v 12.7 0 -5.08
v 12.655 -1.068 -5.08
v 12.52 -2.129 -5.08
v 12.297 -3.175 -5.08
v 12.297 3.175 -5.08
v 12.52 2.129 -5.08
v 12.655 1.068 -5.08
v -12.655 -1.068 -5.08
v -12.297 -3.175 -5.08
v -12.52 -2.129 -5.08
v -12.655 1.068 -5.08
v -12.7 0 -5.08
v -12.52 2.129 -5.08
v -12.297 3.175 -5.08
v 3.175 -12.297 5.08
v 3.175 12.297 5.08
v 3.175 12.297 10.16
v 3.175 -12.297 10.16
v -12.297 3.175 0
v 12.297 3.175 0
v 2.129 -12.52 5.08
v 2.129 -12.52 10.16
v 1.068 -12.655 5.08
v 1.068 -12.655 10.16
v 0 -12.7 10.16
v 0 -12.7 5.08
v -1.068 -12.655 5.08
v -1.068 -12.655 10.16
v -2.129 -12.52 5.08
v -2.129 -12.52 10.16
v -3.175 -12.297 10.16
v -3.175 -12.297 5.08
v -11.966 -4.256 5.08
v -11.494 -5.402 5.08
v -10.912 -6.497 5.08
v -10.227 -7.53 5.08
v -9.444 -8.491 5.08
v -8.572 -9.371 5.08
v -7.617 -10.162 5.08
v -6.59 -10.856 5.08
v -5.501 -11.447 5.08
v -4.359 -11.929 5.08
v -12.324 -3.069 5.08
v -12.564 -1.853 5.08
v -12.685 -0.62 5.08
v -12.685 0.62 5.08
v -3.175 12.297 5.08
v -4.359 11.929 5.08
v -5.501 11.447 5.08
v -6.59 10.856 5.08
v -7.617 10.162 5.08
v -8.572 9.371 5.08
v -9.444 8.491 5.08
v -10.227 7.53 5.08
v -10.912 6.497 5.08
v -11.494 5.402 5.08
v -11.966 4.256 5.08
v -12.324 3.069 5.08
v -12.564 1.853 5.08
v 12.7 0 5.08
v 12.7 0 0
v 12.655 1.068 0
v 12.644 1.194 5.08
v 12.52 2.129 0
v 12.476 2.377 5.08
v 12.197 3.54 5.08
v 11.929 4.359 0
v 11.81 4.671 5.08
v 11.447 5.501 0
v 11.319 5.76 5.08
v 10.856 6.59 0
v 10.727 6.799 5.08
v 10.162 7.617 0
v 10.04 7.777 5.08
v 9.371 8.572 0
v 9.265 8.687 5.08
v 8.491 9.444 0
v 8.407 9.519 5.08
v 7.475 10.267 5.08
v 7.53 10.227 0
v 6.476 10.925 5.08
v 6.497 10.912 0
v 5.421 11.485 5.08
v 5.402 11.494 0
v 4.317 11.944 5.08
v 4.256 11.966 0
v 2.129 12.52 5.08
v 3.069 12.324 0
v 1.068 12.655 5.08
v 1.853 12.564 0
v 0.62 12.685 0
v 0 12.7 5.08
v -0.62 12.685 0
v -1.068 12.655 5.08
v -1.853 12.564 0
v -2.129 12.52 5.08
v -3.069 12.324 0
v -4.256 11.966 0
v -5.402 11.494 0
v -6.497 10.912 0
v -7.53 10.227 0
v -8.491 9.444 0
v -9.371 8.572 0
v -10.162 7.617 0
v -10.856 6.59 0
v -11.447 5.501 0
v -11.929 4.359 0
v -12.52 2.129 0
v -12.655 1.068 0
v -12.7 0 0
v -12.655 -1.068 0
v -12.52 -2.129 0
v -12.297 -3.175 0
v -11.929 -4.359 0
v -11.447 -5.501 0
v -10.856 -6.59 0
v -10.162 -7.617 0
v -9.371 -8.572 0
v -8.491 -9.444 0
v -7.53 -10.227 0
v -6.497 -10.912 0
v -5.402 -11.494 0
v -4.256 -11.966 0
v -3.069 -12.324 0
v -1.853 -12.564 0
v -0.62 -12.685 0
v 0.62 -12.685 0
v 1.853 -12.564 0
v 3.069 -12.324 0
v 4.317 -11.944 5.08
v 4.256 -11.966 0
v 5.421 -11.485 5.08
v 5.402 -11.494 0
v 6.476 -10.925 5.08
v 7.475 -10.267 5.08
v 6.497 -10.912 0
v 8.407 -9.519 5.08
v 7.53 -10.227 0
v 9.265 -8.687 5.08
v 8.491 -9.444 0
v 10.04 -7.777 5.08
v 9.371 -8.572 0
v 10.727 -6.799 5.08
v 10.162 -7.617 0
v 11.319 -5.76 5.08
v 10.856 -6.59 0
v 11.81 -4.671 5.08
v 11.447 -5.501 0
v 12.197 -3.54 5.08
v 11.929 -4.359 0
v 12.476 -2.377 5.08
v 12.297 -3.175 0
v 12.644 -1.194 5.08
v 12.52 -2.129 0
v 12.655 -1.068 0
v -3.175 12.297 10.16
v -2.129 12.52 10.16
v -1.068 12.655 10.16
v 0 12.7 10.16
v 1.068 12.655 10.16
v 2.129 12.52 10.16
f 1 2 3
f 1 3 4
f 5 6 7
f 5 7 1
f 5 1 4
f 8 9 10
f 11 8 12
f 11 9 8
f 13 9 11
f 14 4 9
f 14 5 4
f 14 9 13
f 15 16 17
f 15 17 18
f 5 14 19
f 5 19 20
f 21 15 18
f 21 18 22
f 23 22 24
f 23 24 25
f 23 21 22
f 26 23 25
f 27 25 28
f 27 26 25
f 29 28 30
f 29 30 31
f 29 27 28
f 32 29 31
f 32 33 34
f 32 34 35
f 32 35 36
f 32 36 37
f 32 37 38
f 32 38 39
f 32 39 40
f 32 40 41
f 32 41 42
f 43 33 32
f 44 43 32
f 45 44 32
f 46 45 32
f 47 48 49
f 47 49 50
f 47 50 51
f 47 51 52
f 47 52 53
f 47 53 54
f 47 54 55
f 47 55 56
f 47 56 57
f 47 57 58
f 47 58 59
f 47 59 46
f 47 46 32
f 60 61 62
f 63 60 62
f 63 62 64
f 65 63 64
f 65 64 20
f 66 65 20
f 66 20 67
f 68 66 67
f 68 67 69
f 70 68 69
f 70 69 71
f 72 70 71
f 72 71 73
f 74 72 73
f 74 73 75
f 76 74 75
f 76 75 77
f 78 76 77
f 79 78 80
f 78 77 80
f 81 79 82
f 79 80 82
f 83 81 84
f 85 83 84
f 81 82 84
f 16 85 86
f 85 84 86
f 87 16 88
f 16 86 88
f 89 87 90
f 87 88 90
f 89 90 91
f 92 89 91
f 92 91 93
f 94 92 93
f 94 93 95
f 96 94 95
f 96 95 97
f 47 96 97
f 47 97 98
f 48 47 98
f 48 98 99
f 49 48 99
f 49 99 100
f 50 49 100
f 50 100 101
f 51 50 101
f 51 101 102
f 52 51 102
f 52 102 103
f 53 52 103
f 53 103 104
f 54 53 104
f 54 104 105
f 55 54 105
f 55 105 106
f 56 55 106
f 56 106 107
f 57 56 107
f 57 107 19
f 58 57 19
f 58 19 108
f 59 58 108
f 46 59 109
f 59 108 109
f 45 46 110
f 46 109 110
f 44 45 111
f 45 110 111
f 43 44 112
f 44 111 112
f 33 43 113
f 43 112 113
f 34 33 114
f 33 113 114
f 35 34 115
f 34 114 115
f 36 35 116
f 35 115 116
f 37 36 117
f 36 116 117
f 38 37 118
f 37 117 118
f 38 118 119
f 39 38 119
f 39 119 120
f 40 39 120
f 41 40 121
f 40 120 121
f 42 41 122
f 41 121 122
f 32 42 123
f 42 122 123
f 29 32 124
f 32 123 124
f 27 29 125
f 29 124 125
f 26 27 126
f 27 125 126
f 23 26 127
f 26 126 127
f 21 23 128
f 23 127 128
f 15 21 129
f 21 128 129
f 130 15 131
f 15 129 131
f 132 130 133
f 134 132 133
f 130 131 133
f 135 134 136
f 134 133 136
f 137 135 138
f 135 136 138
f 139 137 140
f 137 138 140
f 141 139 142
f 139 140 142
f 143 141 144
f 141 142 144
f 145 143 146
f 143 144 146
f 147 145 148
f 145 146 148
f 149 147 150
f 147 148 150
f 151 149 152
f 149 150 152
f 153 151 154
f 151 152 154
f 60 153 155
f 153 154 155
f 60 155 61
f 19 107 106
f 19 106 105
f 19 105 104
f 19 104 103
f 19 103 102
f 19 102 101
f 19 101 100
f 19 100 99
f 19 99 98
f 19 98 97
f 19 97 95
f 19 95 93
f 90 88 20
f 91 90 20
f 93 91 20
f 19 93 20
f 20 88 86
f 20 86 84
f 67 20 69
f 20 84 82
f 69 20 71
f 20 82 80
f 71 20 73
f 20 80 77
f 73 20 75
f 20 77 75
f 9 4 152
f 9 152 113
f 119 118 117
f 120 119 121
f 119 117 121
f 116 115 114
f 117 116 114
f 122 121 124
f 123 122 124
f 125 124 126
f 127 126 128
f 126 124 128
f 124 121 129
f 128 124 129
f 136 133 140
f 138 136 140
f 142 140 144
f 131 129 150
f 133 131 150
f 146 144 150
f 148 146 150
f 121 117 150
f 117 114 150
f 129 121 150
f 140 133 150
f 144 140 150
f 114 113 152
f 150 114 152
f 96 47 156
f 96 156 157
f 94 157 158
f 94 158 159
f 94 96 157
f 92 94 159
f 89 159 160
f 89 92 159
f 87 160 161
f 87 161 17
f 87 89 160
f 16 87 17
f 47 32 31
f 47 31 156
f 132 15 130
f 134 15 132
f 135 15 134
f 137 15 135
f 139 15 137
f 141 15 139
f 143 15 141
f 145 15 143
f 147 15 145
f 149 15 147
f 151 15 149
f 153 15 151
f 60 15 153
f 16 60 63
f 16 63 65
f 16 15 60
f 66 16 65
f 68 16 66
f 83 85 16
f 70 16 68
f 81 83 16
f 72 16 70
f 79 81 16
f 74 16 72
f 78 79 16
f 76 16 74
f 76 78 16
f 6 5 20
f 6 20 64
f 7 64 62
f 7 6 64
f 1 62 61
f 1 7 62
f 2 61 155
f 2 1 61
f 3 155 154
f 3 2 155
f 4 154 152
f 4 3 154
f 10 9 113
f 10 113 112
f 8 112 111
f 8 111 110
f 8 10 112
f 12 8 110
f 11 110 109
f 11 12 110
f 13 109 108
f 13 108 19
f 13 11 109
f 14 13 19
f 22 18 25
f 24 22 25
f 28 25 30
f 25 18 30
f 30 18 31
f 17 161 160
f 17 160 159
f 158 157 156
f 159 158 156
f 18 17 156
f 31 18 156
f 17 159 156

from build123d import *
from build123d.topology import SkipClean

# Parameters (mm, degrees)
SKETCH1_R           = 12.7
BOSS_EXTRUDE1_DEPTH = 5.08
BOSS_EXTRUDE2_START = 5.08
BOSS_EXTRUDE2_DEPTH = 5.08
BOSS_EXTRUDE3_DEPTH = 5.08


with BuildPart() as part:
    # Sketch1 → Boss-Extrude1 (new body)
    with BuildSketch(Plane.XY):
        Circle(SKETCH1_R)
    extrude(amount=BOSS_EXTRUDE1_DEPTH)

    # Sketch2 → Boss-Extrude2 (add)
    with SkipClean():  # the faces are left unmerged after this step: merging them gives an invalid solid
        with BuildSketch(Plane(origin=(0, 0, 0), x_dir=(-1, 0, 0), z_dir=(0, 0, -1)).offset(BOSS_EXTRUDE2_START)):
            with BuildLine():
                Line((12.296722124, 3.175), (-12.296722124, 3.175))
                ThreePointArc((-12.296722124, 3.175), (-12.7, 0), (-12.296722124, -3.175))
                Line((-12.296722124, -3.175), (12.296722124, -3.175))
                ThreePointArc((12.296722124, -3.175), (12.7, 0), (12.296722124, 3.175))
            make_face()
        extrude(amount=-BOSS_EXTRUDE2_DEPTH)

    # Sketch4 → Boss-Extrude3 (add)
    with SkipClean():  # the faces are left unmerged after this step: merging them gives an invalid solid
        with BuildSketch(Plane.XY.offset(5.08)):
            with BuildLine():
                Line((-3.175, -12.296722124), (-3.175, 12.296722124))
                ThreePointArc((-3.175, 12.296722124), (0, 12.7), (3.175, 12.296722124))
                Line((3.175, 12.296722124), (3.175, -12.296722124))
                ThreePointArc((3.175, -12.296722124), (0, -12.7), (-3.175, -12.296722124))
            make_face()
        extrude(amount=BOSS_EXTRUDE3_DEPTH)


solid = part.part
